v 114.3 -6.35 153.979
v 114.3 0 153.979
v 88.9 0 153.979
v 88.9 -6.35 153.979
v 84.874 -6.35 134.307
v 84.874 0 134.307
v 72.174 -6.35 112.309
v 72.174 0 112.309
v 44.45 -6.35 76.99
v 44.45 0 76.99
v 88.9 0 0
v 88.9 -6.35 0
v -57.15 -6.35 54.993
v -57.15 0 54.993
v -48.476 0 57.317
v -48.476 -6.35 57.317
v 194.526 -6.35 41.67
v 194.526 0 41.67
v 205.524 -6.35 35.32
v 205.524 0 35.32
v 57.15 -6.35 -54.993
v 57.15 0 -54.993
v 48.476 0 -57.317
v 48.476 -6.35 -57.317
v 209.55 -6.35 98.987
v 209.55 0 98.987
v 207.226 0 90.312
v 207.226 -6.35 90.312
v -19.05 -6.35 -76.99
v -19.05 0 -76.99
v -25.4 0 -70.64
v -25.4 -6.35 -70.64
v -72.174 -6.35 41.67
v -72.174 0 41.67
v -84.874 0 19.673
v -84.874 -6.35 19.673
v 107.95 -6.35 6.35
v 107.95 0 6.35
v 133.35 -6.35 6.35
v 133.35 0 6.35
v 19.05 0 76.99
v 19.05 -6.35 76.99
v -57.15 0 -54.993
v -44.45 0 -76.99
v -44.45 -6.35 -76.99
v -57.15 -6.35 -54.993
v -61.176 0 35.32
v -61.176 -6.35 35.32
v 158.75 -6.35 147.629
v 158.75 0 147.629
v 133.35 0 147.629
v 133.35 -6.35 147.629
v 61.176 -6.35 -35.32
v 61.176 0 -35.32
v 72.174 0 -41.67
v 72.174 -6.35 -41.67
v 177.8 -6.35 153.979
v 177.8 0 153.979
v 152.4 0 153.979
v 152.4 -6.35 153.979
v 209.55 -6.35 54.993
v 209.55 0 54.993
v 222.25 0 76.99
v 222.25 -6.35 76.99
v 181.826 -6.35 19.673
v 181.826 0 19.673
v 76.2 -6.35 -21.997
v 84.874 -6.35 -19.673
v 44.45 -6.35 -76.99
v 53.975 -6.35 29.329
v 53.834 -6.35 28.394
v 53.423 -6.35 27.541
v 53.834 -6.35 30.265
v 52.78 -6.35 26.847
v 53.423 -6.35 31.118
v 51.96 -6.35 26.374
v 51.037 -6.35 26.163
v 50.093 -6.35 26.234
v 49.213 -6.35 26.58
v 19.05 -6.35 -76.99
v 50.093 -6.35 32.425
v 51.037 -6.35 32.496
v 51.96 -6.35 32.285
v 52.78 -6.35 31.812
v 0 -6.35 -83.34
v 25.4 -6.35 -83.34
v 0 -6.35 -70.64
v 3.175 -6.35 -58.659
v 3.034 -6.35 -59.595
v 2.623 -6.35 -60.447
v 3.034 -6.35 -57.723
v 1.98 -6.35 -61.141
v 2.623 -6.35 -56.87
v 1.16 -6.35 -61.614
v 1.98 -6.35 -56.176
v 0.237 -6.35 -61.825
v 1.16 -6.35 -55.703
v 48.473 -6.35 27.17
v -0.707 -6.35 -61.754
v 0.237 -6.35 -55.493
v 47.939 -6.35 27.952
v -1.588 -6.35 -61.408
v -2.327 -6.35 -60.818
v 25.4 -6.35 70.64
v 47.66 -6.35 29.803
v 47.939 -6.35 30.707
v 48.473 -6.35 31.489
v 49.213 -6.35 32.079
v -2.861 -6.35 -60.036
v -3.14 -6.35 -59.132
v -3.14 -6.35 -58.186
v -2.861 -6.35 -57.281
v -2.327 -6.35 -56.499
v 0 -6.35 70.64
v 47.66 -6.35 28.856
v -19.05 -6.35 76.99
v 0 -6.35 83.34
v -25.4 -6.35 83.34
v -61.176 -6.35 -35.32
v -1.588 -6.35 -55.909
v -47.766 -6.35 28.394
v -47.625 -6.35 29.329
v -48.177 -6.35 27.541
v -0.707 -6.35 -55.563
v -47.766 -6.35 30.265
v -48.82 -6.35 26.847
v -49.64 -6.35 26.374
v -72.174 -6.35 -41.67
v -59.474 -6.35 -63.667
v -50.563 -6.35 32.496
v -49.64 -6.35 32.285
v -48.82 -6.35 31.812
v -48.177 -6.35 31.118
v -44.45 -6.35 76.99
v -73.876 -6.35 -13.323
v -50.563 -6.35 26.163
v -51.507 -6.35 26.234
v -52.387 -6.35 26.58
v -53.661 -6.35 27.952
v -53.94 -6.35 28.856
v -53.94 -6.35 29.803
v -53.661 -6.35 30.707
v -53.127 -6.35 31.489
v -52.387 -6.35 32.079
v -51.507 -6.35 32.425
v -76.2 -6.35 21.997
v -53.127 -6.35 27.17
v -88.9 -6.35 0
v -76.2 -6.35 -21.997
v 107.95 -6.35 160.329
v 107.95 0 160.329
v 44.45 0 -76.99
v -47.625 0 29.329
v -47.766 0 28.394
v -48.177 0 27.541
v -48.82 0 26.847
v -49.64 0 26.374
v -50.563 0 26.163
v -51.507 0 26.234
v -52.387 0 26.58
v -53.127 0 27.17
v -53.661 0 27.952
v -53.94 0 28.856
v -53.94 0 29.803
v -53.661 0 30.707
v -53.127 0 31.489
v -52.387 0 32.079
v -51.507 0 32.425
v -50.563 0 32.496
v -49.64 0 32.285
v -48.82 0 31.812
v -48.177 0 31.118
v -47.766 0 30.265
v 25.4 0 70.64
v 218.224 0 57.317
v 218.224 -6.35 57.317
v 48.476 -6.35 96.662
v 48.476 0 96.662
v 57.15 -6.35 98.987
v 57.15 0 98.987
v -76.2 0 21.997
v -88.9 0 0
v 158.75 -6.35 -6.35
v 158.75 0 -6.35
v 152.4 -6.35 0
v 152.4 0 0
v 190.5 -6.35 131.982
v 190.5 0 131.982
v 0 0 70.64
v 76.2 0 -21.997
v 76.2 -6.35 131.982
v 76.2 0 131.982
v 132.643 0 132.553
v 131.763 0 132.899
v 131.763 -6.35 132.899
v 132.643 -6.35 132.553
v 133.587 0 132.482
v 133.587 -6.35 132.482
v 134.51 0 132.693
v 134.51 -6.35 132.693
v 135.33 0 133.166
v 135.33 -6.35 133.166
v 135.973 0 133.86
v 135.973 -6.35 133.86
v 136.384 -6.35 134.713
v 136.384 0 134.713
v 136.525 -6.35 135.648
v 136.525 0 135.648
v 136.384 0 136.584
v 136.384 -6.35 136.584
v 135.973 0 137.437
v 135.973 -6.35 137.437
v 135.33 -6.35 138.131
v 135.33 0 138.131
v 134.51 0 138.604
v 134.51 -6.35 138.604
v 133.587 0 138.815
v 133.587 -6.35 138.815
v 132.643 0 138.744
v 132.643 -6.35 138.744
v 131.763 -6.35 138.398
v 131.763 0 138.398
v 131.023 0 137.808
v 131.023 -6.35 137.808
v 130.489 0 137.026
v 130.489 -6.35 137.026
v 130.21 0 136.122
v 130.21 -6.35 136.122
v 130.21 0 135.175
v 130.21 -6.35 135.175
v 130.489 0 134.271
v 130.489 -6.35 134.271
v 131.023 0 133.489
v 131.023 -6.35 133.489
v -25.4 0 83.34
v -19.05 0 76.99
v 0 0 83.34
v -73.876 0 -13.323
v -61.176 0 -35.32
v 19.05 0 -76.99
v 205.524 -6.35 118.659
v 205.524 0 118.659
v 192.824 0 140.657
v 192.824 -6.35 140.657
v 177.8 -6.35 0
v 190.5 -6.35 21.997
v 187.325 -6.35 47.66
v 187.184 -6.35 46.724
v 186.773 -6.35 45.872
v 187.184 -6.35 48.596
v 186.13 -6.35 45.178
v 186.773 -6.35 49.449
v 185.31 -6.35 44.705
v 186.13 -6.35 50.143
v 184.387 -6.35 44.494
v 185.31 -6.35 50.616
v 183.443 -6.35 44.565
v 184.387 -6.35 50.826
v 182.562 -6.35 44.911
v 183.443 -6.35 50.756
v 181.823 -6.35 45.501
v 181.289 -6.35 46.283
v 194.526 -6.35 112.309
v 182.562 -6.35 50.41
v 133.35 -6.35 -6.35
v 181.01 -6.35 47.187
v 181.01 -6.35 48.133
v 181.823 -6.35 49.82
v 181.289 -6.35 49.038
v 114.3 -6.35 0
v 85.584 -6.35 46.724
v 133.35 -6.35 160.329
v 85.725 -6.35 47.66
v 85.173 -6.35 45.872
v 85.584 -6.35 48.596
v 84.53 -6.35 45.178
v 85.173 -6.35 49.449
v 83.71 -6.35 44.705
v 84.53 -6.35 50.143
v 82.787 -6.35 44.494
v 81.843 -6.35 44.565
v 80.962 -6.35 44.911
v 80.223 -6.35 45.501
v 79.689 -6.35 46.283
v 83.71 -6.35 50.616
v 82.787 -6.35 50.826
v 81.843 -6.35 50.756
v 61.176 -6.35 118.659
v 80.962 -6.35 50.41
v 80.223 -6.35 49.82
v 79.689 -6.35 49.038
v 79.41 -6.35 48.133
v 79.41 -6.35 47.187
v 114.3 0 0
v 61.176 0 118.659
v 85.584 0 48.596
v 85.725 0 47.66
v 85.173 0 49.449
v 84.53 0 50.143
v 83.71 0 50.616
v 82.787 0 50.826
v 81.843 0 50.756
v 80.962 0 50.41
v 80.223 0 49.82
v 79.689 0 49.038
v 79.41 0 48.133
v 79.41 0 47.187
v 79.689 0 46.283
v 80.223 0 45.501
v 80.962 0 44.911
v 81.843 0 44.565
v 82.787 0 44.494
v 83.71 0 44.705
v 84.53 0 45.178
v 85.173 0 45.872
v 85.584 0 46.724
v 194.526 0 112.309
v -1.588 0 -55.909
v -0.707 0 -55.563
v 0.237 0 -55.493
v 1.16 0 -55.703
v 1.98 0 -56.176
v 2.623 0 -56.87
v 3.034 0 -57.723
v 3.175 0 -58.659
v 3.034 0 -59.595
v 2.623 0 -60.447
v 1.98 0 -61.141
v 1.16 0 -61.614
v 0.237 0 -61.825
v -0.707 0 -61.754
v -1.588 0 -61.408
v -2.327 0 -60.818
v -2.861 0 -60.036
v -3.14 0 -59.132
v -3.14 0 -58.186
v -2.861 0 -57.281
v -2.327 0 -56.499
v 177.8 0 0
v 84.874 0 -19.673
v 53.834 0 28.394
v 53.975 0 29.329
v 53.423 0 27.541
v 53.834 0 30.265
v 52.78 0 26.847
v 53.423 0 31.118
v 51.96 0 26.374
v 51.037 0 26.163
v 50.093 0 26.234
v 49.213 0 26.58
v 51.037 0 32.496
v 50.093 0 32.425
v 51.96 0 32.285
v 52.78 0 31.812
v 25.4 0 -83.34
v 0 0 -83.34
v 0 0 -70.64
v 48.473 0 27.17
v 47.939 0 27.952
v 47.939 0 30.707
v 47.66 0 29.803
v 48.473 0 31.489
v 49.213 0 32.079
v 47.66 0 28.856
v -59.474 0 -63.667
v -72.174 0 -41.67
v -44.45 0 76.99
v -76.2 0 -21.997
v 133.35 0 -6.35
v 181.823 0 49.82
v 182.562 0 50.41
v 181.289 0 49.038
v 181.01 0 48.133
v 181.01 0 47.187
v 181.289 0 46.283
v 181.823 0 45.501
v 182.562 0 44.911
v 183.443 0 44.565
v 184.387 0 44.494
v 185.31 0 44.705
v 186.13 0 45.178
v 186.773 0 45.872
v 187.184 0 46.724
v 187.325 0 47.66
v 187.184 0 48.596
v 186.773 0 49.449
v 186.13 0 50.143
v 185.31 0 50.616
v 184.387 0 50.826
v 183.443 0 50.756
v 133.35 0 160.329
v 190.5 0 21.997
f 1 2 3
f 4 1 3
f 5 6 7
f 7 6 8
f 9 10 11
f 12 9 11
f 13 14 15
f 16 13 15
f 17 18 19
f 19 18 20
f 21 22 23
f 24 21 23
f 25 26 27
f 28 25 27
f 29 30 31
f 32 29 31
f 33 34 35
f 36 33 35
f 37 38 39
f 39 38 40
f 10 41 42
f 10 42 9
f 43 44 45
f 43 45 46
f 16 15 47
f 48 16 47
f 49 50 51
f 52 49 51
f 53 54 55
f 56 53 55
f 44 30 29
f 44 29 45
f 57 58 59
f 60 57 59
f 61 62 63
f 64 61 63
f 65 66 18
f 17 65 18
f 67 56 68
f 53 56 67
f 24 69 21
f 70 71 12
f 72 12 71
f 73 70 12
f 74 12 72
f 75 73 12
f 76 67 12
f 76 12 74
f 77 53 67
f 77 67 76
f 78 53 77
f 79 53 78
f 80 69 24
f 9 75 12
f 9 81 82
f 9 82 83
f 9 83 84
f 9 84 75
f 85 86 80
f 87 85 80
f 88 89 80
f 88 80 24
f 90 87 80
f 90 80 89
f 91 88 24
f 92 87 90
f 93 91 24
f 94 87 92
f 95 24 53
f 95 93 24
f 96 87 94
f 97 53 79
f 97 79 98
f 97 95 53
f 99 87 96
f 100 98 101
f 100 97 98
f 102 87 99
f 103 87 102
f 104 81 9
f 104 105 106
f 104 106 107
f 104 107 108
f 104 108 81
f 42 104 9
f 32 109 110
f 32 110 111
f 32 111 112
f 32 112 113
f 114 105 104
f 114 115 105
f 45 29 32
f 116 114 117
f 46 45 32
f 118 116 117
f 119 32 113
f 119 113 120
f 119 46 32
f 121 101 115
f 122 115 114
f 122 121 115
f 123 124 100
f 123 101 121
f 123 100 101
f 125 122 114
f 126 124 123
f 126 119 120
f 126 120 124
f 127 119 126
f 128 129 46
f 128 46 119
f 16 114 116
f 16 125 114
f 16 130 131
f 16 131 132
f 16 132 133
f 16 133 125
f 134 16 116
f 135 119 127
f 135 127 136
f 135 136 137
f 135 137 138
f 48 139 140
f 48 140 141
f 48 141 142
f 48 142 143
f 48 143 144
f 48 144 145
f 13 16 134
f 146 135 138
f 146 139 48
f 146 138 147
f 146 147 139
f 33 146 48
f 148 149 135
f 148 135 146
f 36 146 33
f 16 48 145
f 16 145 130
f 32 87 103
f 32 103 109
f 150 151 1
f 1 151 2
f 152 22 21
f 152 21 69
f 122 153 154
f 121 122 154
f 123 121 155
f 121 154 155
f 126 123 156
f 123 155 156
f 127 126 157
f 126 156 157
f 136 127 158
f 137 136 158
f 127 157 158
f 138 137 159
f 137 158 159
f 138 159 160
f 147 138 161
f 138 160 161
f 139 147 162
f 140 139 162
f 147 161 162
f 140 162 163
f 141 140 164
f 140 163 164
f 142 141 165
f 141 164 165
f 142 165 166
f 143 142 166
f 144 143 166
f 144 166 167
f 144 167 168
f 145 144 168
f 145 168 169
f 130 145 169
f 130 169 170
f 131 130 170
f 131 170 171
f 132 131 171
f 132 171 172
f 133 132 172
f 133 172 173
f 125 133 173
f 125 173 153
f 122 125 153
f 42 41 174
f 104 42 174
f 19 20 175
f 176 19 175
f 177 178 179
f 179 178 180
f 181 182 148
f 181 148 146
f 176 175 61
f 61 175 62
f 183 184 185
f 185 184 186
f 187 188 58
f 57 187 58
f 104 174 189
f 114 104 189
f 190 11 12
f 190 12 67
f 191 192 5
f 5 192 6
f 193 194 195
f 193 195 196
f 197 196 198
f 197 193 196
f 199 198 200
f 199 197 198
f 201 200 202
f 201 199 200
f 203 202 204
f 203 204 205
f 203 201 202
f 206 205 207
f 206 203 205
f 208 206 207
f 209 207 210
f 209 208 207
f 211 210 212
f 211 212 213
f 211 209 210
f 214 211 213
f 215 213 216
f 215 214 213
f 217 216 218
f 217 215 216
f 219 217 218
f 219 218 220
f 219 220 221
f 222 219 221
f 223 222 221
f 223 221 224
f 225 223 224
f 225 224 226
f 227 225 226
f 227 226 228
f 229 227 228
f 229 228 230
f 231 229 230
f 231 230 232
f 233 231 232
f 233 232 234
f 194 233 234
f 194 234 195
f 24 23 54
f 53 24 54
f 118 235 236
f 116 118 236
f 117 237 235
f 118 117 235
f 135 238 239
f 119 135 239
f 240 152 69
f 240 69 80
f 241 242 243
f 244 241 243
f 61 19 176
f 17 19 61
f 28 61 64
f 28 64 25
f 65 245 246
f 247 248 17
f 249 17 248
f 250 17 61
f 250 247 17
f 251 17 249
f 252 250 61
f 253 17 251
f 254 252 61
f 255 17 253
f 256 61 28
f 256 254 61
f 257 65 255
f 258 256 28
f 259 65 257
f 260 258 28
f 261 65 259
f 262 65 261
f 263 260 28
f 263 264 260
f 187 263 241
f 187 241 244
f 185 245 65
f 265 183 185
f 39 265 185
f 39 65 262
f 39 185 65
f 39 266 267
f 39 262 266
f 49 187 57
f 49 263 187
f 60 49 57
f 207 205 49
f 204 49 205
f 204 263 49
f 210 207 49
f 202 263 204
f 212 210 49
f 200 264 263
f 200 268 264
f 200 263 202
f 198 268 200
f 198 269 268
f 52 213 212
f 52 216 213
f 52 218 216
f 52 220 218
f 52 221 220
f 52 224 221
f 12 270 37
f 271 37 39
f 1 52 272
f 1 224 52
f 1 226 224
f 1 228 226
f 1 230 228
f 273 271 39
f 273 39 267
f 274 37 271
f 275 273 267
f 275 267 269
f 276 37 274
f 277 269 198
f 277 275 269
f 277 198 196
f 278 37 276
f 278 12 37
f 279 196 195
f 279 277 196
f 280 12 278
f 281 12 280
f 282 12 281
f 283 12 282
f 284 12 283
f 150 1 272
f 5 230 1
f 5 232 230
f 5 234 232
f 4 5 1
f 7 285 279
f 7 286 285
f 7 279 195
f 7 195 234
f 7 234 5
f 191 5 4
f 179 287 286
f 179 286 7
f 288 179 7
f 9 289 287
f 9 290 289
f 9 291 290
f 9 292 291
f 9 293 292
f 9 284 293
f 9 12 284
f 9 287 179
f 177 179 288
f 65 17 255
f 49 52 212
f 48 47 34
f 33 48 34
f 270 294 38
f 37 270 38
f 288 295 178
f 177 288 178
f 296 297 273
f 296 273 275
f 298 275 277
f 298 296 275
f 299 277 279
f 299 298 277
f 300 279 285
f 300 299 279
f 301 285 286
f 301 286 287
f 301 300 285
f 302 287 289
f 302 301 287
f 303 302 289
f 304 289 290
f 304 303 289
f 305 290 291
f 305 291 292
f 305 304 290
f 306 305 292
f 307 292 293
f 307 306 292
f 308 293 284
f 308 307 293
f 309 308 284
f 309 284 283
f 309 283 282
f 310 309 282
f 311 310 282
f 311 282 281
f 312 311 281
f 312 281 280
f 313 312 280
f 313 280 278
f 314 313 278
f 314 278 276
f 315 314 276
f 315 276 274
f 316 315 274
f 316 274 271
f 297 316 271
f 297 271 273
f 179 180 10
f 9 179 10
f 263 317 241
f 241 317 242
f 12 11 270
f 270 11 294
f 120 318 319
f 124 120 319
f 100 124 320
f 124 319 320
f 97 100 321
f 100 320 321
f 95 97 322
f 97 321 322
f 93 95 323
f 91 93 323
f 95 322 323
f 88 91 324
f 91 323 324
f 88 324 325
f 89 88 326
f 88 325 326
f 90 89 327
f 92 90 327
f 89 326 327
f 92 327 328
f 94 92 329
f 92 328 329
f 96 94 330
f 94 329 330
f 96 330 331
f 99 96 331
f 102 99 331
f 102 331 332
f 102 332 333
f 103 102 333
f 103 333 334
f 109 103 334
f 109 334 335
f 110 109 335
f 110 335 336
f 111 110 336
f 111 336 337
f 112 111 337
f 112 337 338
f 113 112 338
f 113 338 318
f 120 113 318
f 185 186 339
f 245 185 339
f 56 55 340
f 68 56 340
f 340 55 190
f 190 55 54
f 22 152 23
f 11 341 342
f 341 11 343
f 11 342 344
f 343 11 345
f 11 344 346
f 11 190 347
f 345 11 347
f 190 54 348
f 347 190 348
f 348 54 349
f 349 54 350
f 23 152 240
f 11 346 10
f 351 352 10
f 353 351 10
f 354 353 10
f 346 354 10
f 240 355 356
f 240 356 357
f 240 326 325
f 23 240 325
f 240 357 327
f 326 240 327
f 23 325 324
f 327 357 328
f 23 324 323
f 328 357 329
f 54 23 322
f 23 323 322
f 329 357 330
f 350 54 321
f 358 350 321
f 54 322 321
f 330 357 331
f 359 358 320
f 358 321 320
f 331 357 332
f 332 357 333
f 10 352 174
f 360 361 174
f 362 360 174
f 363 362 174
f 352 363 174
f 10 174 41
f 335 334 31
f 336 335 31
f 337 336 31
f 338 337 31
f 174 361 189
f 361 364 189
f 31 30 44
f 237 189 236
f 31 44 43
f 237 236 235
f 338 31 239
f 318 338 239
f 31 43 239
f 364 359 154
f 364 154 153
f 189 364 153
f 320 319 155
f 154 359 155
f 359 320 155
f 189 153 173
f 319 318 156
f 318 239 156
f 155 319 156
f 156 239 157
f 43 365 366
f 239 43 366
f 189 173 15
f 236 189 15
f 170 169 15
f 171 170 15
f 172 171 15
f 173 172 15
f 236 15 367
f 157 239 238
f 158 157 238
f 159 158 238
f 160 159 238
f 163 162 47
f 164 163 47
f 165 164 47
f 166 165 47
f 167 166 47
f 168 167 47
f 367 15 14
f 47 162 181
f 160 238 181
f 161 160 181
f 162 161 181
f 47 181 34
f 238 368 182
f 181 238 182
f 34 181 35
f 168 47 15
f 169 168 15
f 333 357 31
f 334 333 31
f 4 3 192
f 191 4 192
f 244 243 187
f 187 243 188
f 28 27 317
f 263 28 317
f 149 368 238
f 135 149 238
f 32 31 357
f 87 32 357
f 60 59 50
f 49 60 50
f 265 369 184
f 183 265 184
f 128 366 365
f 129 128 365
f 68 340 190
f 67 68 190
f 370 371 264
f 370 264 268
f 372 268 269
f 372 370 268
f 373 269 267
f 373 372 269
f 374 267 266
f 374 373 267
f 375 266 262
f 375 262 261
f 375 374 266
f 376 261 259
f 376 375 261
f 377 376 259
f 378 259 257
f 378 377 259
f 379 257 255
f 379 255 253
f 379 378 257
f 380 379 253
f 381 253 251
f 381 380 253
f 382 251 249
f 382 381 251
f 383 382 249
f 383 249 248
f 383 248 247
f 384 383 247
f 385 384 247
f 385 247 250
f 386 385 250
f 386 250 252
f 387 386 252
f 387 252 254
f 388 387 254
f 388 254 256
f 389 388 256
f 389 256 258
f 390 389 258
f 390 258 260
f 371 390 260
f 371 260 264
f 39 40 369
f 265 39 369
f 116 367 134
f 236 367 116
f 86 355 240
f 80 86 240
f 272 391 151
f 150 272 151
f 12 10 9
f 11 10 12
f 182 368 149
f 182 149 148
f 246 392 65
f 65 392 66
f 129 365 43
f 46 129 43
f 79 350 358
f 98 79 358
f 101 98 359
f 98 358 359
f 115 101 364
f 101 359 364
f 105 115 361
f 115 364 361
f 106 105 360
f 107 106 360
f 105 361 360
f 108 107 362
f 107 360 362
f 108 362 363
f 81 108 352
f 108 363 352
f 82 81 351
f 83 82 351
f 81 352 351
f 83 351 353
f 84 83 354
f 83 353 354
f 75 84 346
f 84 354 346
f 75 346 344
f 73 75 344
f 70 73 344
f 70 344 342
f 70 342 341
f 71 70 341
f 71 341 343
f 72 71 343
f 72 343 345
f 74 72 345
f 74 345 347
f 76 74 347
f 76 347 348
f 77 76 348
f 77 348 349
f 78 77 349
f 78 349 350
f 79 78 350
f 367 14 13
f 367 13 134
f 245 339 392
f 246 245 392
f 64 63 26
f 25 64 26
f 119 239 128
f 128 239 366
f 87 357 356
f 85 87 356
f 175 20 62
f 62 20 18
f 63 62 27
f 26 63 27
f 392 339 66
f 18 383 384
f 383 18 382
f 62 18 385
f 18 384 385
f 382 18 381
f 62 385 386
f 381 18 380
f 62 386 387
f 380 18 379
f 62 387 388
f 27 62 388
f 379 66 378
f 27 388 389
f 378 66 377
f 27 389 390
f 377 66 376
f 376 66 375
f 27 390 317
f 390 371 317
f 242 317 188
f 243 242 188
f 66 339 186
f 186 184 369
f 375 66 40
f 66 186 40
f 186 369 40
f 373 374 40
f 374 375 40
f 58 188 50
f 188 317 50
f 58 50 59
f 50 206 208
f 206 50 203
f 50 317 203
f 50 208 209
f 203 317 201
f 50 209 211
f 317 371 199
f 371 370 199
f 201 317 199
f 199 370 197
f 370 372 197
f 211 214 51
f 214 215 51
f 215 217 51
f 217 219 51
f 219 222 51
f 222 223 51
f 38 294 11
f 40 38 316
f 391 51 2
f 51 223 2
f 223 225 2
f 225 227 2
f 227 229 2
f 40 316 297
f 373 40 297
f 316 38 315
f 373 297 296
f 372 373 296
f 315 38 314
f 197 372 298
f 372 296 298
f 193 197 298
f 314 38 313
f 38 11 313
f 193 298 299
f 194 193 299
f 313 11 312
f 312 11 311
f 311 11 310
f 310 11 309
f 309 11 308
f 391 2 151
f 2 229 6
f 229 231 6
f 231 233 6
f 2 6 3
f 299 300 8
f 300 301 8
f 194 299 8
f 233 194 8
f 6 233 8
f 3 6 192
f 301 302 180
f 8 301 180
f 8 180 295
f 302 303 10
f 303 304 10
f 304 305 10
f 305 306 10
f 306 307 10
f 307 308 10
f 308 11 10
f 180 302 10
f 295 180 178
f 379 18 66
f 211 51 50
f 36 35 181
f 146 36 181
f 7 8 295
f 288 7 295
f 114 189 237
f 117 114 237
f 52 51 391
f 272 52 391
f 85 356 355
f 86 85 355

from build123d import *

# Parameters (mm, degrees)
BOSS_EXTRUDE1_DEPTH = 6.35
SKETCH9_R           = 3.175
CUT_EXTRUDE3_DEPTH  = 118.774954893
CIRPATTERN6_COUNT   = 3
CUT_EXTRUDE4_DEPTH  = 271.453350876
BOSS_EXTRUDE4_DEPTH = 6.35
CIRPATTERN7_COUNT   = 6
CUT_EXTRUDE5_DEPTH  = 271.453350876
BOSS_EXTRUDE5_DEPTH = 6.35
CIRPATTERN8_COUNT   = 6


with BuildPart() as part:
    # Sketch1 → Boss-Extrude1 (new body)
    with BuildSketch(Plane(origin=(0, 0, 0), x_dir=(1, 0, 0), z_dir=(0, 1, 0))):
        Polygon((88.9, 0), (44.45, 76.989658396), (-44.45, 76.989658396), (-88.9, 0), (-44.45, -76.989658396), (44.45, -76.989658396), align=None)
    extrude(amount=-BOSS_EXTRUDE1_DEPTH)

    # Sketch9 → Cut-Extrude3 (cut, through all)
    with BuildSketch(Plane(origin=(0, 0, 0), x_dir=(1, 0, 0), z_dir=(0, 1, 0))):
        with Locations((-50.8, -29.329393675)):
            Circle(SKETCH9_R)
    cut_extrude3 = extrude(amount=-CUT_EXTRUDE3_DEPTH, mode=Mode.SUBTRACT)

    # CirPattern6: Cut-Extrude3 ×3 about axis
    cirpattern6_axis = Axis((0, 0, 0), (0, 1, 0))
    for i in range(1, CIRPATTERN6_COUNT):
        add(cut_extrude3.rotate(cirpattern6_axis, i * 360 / CIRPATTERN6_COUNT), mode=Mode.SUBTRACT)


with BuildPart() as body_2:
    # Mirror3: mirrored copy
    add(part.part.mirror(Plane(origin=(44.45, -6.35, 76.989658396), x_dir=(-0.49999999999999495, 0, 0.8660254037844416), z_dir=(0.8660254037844416, 0, 0.49999999999999495))))

    # Sketch13 → Cut-Extrude5 (cut, through all)
    with BuildSketch(Plane(origin=(0, 0, 0), x_dir=(1, 0, 0), z_dir=(0, 1, 0))):
        Polygon((190.5, -21.997045256), (181.825738686, -19.672783942), (194.525738686, -41.669829198), (200.025, -38.494829198), align=None)
    cut_extrude5 = extrude(amount=-CUT_EXTRUDE5_DEPTH, mode=Mode.SUBTRACT)

    # Sketch14 → Boss-Extrude5 (add)
    with BuildSketch(Plane(origin=(0, 0, 0), x_dir=(1, 0, 0), z_dir=(0, 1, 0))):
        Polygon((200.025, -38.494829198), (205.524261314, -35.319829198), (218.224261314, -57.316874454), (209.55, -54.99261314), align=None)
    boss_extrude5 = extrude(amount=-BOSS_EXTRUDE5_DEPTH)

    # CirPattern8: Cut-Extrude5, Boss-Extrude5 ×6 about axis, 1 skipped
    cirpattern8_axis = Axis((133.35, 0, 76.989658396), (0, 1, 0))
    add([cut_extrude5.rotate(cirpattern8_axis, i * 360 / CIRPATTERN8_COUNT) for i in range(1, CIRPATTERN8_COUNT) if i not in (2,)], mode=Mode.SUBTRACT)
    add([boss_extrude5.rotate(cirpattern8_axis, i * 360 / CIRPATTERN8_COUNT) for i in range(1, CIRPATTERN8_COUNT) if i not in (2,)])


with BuildPart() as part_1:
    add(part.part)

    # Sketch10 → Cut-Extrude4 (cut, through all)
    with BuildSketch(Plane(origin=(0, 0, 0), x_dir=(1, 0, 0), z_dir=(0, 1, 0))):
        Polygon((57.15, 54.99261314), (48.475738686, 57.316874454), (61.175738686, 35.319829198), (66.675, 38.494829198), align=None)
    cut_extrude4 = extrude(amount=-CUT_EXTRUDE4_DEPTH, mode=Mode.SUBTRACT)

    # Sketch11 → Boss-Extrude4 (add)
    with BuildSketch(Plane(origin=(0, 0, 0), x_dir=(1, 0, 0), z_dir=(0, 1, 0))):
        Polygon((66.675, 38.494829198), (72.174261314, 41.669829198), (84.874261314, 19.672783942), (76.2, 21.997045256), align=None)
    boss_extrude4 = extrude(amount=-BOSS_EXTRUDE4_DEPTH)

    # CirPattern7: Cut-Extrude4, Boss-Extrude4 ×6 about axis, 1 skipped
    cirpattern7_axis = Axis((0, 0, 0), (0, 1, 0))
    add([cut_extrude4.rotate(cirpattern7_axis, i * 360 / CIRPATTERN7_COUNT) for i in range(1, CIRPATTERN7_COUNT) if i not in (5,)], mode=Mode.SUBTRACT)
    add([boss_extrude4.rotate(cirpattern7_axis, i * 360 / CIRPATTERN7_COUNT) for i in range(1, CIRPATTERN7_COUNT) if i not in (5,)])


solid = Compound([body_2.part, part_1.part])
